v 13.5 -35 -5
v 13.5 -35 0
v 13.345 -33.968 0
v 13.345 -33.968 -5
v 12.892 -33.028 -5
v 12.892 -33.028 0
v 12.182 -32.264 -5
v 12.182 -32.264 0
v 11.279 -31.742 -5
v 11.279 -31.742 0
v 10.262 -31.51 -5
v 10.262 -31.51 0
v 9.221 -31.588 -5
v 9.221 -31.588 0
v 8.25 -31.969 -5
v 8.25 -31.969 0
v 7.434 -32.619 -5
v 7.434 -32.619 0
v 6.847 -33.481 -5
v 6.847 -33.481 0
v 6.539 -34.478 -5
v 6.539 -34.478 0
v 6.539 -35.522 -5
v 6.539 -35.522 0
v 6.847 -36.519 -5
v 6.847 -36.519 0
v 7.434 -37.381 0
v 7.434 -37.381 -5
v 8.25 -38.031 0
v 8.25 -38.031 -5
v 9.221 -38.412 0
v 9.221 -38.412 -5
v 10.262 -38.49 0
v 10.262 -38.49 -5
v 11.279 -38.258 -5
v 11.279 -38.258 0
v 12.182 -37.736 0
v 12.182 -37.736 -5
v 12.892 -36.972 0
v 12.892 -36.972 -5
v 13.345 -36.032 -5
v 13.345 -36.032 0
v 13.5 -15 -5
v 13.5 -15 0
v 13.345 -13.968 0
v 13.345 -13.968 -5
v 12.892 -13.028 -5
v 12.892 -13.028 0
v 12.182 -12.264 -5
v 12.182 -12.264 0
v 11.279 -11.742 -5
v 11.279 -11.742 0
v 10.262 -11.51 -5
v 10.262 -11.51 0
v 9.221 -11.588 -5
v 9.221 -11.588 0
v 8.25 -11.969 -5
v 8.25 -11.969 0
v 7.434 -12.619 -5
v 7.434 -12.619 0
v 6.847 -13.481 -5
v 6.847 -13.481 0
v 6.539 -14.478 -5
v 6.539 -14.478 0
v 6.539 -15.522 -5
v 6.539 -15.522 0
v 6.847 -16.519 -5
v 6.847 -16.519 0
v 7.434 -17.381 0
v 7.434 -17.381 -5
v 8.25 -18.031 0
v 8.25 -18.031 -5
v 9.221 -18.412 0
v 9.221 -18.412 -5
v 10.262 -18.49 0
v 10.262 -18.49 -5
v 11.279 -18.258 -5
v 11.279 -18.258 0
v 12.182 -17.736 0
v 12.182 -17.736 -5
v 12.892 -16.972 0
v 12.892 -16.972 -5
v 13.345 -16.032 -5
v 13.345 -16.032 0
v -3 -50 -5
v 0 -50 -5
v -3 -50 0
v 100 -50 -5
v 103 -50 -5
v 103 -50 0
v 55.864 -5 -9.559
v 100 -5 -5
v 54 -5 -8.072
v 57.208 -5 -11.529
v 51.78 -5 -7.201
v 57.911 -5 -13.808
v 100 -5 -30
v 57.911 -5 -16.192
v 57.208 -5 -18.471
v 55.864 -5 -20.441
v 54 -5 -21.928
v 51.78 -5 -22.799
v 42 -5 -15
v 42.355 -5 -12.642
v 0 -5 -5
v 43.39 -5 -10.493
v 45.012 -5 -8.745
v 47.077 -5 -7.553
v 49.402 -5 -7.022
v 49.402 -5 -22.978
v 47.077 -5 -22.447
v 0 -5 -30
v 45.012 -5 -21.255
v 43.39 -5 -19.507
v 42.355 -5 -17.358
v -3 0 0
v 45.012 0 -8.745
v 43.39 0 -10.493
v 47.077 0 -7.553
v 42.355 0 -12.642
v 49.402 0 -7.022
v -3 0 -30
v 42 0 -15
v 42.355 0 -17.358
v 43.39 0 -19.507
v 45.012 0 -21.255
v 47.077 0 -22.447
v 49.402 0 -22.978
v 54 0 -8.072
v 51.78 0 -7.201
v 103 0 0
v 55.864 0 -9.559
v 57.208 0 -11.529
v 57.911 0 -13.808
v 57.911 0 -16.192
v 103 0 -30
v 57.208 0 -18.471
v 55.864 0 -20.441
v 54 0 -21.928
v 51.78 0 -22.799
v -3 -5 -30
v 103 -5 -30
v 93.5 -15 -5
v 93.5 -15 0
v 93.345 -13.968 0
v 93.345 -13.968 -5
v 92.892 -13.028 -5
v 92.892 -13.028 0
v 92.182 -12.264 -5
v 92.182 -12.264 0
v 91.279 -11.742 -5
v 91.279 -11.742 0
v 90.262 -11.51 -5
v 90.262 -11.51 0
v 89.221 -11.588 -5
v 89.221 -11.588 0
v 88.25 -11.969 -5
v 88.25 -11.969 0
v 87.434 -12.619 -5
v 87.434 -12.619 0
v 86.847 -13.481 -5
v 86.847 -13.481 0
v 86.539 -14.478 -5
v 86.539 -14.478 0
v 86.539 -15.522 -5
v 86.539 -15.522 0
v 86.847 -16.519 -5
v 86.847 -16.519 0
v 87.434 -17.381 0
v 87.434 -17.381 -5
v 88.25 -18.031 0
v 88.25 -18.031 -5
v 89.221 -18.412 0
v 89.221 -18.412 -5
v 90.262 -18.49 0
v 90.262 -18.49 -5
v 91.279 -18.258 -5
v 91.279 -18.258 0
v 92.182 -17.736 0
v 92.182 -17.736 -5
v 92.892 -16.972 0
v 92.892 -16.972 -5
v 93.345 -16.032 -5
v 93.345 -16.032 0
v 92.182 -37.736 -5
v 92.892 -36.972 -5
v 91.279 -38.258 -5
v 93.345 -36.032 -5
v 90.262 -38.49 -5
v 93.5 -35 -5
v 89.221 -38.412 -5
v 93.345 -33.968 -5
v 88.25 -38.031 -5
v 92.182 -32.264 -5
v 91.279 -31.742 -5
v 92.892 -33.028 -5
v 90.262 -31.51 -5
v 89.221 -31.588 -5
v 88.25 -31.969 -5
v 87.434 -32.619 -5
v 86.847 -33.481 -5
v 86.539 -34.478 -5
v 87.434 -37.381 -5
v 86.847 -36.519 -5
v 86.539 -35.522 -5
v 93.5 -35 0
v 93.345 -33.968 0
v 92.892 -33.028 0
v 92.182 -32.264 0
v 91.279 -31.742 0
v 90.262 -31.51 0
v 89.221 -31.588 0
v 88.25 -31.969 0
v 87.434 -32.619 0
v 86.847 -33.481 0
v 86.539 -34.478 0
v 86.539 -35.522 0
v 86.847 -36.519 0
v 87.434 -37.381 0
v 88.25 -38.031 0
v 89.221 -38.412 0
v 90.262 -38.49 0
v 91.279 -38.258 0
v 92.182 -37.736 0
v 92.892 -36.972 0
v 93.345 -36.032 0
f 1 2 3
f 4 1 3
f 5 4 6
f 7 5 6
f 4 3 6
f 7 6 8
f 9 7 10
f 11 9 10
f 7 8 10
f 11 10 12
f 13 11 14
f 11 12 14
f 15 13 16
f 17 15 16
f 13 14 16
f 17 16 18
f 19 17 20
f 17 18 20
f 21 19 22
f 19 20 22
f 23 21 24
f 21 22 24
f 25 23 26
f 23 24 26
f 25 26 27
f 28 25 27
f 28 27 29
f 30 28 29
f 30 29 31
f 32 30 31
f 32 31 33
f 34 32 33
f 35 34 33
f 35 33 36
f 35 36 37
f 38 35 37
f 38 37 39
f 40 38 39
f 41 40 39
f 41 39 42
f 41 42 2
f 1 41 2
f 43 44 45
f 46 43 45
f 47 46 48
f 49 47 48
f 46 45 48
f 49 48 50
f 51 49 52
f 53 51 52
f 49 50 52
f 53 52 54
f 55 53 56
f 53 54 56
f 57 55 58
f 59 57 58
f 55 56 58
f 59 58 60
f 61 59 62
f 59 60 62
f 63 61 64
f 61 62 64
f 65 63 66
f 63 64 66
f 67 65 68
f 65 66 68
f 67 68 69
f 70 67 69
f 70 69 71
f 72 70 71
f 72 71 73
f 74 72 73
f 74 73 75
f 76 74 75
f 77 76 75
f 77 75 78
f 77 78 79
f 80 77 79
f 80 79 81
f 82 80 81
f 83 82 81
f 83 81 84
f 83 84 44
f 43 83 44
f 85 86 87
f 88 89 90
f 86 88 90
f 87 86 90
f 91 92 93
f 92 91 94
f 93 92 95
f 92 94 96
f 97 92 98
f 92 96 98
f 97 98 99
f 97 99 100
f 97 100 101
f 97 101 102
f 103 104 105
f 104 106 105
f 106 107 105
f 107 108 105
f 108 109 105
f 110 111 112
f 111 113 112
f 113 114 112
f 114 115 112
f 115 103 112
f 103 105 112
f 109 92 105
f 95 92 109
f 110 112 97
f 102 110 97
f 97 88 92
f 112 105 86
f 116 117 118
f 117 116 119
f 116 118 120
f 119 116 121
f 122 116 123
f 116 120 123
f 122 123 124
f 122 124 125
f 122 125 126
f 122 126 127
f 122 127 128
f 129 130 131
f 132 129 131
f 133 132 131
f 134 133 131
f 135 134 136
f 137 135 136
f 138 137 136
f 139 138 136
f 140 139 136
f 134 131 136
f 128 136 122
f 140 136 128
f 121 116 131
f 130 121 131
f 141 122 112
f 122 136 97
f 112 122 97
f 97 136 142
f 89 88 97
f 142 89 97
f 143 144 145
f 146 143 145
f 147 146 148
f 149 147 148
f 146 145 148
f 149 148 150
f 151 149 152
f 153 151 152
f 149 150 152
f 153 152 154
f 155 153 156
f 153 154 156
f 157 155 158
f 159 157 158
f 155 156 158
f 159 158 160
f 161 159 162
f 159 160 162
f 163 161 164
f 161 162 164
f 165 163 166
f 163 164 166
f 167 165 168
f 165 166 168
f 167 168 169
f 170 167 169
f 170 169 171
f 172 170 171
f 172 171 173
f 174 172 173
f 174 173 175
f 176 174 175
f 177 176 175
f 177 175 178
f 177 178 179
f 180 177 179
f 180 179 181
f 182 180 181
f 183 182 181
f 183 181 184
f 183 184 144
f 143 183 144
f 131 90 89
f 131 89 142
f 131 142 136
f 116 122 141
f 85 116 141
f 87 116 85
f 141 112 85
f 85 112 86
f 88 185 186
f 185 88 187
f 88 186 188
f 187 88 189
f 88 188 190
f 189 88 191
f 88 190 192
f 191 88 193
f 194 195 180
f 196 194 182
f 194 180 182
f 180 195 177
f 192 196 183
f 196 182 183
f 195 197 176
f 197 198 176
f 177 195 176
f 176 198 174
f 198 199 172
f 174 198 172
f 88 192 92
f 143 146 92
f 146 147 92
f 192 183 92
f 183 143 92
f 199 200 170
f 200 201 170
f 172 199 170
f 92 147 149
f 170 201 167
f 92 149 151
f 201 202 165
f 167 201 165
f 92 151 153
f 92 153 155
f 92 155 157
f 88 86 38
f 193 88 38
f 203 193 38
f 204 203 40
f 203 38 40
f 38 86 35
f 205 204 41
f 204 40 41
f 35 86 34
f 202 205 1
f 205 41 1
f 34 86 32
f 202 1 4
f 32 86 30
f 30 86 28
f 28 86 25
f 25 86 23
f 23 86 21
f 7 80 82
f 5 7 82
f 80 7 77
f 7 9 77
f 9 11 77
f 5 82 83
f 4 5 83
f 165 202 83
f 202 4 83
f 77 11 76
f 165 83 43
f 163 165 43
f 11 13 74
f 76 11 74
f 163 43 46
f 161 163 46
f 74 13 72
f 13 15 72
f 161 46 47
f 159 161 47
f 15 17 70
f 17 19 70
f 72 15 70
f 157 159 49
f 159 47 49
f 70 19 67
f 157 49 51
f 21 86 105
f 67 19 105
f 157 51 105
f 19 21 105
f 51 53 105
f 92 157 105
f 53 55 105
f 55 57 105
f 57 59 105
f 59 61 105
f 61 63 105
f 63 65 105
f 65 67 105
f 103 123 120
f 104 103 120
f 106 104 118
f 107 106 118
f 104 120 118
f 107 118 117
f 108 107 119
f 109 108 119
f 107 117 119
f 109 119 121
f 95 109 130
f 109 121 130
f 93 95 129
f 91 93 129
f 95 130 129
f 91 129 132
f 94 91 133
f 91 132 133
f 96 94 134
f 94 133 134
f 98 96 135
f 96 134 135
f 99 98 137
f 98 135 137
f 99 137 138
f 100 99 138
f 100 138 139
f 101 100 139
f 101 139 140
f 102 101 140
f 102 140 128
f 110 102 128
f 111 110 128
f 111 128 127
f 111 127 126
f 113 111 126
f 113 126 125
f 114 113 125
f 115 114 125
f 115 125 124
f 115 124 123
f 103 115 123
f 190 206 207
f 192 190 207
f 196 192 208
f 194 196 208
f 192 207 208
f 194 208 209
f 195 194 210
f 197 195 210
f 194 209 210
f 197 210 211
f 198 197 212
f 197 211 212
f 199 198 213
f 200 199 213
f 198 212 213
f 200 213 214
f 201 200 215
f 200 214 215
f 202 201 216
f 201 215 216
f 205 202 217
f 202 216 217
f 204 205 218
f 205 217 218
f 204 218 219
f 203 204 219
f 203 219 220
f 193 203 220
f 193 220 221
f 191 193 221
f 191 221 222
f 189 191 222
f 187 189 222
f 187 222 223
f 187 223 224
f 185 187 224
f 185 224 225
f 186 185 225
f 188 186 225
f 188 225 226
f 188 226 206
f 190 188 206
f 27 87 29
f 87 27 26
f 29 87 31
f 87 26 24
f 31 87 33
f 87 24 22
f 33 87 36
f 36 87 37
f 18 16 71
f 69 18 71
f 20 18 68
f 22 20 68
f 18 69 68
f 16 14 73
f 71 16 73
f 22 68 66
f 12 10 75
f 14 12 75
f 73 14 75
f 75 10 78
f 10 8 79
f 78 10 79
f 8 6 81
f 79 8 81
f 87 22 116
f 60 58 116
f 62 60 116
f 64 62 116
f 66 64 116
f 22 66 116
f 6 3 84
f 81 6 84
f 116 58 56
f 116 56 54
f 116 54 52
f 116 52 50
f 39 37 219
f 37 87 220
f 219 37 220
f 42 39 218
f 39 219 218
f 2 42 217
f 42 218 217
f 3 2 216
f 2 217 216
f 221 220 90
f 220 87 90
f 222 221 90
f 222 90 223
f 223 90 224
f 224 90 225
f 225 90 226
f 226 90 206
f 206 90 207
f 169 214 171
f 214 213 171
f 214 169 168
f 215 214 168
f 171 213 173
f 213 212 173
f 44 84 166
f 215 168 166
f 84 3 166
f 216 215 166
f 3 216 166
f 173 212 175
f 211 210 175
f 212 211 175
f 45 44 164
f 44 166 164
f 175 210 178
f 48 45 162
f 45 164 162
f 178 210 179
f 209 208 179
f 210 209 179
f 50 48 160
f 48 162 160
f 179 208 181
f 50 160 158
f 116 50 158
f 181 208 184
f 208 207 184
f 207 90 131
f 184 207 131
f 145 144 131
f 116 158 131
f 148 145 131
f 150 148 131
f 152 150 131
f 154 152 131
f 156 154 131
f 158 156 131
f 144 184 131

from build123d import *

# Parameters (mm, degrees)
F1_DEPTH = 100
F2_R     = 3.5
F3_DEPTH = 30.001
F4_R     = 8
F5_DEPTH = 50.001
F7_DEPTH = 3
F9_DEPTH = 3


with BuildPart() as f1:
    # F0 (on Right) → F1 (new body)
    with BuildSketch(Plane.YZ):
        Polygon((0, 0), (-50, 0), (-50, -5), (-5, -5), (-5, -30), (0, -30), align=None)
    extrude(amount=F1_DEPTH)

    # F2 (on face) → F3 (cut, through all)
    with BuildSketch(Plane.XY):
        with Locations((10, -35)):
            Circle(F2_R)
        with Locations((10, -15)):
            Circle(F2_R)
        with Locations((90, -35)):
            Circle(F2_R)
        with Locations((90, -15)):
            Circle(F2_R)
    extrude(amount=-F3_DEPTH, mode=Mode.SUBTRACT)

    # F4 (on face) → F5 (cut, through all)
    with BuildSketch(Plane(origin=(0, 0, 0), x_dir=(-1, 0, 0), z_dir=(0, 1, 0))):
        with Locations((-50, -15)):
            Circle(F4_R)
    extrude(amount=-F5_DEPTH, mode=Mode.SUBTRACT)

    # F6 (on face) → F7 (join)
    with BuildSketch(Plane.YZ.offset(100)):
        Polygon((0, 0), (-50, 0), (-50, -5), (-5, -30), (0, -30), align=None)
    extrude(amount=F7_DEPTH)

    # F8 (on face) → F9 (join)
    with BuildSketch(Plane(origin=(0, 0, 0), x_dir=(0, -1, 0), z_dir=(-1, 0, 0))):
        Polygon((50, -5), (50, 0), (0, 0), (0, -30), (5, -30), align=None)
    extrude(amount=F9_DEPTH)


solid = f1.part
